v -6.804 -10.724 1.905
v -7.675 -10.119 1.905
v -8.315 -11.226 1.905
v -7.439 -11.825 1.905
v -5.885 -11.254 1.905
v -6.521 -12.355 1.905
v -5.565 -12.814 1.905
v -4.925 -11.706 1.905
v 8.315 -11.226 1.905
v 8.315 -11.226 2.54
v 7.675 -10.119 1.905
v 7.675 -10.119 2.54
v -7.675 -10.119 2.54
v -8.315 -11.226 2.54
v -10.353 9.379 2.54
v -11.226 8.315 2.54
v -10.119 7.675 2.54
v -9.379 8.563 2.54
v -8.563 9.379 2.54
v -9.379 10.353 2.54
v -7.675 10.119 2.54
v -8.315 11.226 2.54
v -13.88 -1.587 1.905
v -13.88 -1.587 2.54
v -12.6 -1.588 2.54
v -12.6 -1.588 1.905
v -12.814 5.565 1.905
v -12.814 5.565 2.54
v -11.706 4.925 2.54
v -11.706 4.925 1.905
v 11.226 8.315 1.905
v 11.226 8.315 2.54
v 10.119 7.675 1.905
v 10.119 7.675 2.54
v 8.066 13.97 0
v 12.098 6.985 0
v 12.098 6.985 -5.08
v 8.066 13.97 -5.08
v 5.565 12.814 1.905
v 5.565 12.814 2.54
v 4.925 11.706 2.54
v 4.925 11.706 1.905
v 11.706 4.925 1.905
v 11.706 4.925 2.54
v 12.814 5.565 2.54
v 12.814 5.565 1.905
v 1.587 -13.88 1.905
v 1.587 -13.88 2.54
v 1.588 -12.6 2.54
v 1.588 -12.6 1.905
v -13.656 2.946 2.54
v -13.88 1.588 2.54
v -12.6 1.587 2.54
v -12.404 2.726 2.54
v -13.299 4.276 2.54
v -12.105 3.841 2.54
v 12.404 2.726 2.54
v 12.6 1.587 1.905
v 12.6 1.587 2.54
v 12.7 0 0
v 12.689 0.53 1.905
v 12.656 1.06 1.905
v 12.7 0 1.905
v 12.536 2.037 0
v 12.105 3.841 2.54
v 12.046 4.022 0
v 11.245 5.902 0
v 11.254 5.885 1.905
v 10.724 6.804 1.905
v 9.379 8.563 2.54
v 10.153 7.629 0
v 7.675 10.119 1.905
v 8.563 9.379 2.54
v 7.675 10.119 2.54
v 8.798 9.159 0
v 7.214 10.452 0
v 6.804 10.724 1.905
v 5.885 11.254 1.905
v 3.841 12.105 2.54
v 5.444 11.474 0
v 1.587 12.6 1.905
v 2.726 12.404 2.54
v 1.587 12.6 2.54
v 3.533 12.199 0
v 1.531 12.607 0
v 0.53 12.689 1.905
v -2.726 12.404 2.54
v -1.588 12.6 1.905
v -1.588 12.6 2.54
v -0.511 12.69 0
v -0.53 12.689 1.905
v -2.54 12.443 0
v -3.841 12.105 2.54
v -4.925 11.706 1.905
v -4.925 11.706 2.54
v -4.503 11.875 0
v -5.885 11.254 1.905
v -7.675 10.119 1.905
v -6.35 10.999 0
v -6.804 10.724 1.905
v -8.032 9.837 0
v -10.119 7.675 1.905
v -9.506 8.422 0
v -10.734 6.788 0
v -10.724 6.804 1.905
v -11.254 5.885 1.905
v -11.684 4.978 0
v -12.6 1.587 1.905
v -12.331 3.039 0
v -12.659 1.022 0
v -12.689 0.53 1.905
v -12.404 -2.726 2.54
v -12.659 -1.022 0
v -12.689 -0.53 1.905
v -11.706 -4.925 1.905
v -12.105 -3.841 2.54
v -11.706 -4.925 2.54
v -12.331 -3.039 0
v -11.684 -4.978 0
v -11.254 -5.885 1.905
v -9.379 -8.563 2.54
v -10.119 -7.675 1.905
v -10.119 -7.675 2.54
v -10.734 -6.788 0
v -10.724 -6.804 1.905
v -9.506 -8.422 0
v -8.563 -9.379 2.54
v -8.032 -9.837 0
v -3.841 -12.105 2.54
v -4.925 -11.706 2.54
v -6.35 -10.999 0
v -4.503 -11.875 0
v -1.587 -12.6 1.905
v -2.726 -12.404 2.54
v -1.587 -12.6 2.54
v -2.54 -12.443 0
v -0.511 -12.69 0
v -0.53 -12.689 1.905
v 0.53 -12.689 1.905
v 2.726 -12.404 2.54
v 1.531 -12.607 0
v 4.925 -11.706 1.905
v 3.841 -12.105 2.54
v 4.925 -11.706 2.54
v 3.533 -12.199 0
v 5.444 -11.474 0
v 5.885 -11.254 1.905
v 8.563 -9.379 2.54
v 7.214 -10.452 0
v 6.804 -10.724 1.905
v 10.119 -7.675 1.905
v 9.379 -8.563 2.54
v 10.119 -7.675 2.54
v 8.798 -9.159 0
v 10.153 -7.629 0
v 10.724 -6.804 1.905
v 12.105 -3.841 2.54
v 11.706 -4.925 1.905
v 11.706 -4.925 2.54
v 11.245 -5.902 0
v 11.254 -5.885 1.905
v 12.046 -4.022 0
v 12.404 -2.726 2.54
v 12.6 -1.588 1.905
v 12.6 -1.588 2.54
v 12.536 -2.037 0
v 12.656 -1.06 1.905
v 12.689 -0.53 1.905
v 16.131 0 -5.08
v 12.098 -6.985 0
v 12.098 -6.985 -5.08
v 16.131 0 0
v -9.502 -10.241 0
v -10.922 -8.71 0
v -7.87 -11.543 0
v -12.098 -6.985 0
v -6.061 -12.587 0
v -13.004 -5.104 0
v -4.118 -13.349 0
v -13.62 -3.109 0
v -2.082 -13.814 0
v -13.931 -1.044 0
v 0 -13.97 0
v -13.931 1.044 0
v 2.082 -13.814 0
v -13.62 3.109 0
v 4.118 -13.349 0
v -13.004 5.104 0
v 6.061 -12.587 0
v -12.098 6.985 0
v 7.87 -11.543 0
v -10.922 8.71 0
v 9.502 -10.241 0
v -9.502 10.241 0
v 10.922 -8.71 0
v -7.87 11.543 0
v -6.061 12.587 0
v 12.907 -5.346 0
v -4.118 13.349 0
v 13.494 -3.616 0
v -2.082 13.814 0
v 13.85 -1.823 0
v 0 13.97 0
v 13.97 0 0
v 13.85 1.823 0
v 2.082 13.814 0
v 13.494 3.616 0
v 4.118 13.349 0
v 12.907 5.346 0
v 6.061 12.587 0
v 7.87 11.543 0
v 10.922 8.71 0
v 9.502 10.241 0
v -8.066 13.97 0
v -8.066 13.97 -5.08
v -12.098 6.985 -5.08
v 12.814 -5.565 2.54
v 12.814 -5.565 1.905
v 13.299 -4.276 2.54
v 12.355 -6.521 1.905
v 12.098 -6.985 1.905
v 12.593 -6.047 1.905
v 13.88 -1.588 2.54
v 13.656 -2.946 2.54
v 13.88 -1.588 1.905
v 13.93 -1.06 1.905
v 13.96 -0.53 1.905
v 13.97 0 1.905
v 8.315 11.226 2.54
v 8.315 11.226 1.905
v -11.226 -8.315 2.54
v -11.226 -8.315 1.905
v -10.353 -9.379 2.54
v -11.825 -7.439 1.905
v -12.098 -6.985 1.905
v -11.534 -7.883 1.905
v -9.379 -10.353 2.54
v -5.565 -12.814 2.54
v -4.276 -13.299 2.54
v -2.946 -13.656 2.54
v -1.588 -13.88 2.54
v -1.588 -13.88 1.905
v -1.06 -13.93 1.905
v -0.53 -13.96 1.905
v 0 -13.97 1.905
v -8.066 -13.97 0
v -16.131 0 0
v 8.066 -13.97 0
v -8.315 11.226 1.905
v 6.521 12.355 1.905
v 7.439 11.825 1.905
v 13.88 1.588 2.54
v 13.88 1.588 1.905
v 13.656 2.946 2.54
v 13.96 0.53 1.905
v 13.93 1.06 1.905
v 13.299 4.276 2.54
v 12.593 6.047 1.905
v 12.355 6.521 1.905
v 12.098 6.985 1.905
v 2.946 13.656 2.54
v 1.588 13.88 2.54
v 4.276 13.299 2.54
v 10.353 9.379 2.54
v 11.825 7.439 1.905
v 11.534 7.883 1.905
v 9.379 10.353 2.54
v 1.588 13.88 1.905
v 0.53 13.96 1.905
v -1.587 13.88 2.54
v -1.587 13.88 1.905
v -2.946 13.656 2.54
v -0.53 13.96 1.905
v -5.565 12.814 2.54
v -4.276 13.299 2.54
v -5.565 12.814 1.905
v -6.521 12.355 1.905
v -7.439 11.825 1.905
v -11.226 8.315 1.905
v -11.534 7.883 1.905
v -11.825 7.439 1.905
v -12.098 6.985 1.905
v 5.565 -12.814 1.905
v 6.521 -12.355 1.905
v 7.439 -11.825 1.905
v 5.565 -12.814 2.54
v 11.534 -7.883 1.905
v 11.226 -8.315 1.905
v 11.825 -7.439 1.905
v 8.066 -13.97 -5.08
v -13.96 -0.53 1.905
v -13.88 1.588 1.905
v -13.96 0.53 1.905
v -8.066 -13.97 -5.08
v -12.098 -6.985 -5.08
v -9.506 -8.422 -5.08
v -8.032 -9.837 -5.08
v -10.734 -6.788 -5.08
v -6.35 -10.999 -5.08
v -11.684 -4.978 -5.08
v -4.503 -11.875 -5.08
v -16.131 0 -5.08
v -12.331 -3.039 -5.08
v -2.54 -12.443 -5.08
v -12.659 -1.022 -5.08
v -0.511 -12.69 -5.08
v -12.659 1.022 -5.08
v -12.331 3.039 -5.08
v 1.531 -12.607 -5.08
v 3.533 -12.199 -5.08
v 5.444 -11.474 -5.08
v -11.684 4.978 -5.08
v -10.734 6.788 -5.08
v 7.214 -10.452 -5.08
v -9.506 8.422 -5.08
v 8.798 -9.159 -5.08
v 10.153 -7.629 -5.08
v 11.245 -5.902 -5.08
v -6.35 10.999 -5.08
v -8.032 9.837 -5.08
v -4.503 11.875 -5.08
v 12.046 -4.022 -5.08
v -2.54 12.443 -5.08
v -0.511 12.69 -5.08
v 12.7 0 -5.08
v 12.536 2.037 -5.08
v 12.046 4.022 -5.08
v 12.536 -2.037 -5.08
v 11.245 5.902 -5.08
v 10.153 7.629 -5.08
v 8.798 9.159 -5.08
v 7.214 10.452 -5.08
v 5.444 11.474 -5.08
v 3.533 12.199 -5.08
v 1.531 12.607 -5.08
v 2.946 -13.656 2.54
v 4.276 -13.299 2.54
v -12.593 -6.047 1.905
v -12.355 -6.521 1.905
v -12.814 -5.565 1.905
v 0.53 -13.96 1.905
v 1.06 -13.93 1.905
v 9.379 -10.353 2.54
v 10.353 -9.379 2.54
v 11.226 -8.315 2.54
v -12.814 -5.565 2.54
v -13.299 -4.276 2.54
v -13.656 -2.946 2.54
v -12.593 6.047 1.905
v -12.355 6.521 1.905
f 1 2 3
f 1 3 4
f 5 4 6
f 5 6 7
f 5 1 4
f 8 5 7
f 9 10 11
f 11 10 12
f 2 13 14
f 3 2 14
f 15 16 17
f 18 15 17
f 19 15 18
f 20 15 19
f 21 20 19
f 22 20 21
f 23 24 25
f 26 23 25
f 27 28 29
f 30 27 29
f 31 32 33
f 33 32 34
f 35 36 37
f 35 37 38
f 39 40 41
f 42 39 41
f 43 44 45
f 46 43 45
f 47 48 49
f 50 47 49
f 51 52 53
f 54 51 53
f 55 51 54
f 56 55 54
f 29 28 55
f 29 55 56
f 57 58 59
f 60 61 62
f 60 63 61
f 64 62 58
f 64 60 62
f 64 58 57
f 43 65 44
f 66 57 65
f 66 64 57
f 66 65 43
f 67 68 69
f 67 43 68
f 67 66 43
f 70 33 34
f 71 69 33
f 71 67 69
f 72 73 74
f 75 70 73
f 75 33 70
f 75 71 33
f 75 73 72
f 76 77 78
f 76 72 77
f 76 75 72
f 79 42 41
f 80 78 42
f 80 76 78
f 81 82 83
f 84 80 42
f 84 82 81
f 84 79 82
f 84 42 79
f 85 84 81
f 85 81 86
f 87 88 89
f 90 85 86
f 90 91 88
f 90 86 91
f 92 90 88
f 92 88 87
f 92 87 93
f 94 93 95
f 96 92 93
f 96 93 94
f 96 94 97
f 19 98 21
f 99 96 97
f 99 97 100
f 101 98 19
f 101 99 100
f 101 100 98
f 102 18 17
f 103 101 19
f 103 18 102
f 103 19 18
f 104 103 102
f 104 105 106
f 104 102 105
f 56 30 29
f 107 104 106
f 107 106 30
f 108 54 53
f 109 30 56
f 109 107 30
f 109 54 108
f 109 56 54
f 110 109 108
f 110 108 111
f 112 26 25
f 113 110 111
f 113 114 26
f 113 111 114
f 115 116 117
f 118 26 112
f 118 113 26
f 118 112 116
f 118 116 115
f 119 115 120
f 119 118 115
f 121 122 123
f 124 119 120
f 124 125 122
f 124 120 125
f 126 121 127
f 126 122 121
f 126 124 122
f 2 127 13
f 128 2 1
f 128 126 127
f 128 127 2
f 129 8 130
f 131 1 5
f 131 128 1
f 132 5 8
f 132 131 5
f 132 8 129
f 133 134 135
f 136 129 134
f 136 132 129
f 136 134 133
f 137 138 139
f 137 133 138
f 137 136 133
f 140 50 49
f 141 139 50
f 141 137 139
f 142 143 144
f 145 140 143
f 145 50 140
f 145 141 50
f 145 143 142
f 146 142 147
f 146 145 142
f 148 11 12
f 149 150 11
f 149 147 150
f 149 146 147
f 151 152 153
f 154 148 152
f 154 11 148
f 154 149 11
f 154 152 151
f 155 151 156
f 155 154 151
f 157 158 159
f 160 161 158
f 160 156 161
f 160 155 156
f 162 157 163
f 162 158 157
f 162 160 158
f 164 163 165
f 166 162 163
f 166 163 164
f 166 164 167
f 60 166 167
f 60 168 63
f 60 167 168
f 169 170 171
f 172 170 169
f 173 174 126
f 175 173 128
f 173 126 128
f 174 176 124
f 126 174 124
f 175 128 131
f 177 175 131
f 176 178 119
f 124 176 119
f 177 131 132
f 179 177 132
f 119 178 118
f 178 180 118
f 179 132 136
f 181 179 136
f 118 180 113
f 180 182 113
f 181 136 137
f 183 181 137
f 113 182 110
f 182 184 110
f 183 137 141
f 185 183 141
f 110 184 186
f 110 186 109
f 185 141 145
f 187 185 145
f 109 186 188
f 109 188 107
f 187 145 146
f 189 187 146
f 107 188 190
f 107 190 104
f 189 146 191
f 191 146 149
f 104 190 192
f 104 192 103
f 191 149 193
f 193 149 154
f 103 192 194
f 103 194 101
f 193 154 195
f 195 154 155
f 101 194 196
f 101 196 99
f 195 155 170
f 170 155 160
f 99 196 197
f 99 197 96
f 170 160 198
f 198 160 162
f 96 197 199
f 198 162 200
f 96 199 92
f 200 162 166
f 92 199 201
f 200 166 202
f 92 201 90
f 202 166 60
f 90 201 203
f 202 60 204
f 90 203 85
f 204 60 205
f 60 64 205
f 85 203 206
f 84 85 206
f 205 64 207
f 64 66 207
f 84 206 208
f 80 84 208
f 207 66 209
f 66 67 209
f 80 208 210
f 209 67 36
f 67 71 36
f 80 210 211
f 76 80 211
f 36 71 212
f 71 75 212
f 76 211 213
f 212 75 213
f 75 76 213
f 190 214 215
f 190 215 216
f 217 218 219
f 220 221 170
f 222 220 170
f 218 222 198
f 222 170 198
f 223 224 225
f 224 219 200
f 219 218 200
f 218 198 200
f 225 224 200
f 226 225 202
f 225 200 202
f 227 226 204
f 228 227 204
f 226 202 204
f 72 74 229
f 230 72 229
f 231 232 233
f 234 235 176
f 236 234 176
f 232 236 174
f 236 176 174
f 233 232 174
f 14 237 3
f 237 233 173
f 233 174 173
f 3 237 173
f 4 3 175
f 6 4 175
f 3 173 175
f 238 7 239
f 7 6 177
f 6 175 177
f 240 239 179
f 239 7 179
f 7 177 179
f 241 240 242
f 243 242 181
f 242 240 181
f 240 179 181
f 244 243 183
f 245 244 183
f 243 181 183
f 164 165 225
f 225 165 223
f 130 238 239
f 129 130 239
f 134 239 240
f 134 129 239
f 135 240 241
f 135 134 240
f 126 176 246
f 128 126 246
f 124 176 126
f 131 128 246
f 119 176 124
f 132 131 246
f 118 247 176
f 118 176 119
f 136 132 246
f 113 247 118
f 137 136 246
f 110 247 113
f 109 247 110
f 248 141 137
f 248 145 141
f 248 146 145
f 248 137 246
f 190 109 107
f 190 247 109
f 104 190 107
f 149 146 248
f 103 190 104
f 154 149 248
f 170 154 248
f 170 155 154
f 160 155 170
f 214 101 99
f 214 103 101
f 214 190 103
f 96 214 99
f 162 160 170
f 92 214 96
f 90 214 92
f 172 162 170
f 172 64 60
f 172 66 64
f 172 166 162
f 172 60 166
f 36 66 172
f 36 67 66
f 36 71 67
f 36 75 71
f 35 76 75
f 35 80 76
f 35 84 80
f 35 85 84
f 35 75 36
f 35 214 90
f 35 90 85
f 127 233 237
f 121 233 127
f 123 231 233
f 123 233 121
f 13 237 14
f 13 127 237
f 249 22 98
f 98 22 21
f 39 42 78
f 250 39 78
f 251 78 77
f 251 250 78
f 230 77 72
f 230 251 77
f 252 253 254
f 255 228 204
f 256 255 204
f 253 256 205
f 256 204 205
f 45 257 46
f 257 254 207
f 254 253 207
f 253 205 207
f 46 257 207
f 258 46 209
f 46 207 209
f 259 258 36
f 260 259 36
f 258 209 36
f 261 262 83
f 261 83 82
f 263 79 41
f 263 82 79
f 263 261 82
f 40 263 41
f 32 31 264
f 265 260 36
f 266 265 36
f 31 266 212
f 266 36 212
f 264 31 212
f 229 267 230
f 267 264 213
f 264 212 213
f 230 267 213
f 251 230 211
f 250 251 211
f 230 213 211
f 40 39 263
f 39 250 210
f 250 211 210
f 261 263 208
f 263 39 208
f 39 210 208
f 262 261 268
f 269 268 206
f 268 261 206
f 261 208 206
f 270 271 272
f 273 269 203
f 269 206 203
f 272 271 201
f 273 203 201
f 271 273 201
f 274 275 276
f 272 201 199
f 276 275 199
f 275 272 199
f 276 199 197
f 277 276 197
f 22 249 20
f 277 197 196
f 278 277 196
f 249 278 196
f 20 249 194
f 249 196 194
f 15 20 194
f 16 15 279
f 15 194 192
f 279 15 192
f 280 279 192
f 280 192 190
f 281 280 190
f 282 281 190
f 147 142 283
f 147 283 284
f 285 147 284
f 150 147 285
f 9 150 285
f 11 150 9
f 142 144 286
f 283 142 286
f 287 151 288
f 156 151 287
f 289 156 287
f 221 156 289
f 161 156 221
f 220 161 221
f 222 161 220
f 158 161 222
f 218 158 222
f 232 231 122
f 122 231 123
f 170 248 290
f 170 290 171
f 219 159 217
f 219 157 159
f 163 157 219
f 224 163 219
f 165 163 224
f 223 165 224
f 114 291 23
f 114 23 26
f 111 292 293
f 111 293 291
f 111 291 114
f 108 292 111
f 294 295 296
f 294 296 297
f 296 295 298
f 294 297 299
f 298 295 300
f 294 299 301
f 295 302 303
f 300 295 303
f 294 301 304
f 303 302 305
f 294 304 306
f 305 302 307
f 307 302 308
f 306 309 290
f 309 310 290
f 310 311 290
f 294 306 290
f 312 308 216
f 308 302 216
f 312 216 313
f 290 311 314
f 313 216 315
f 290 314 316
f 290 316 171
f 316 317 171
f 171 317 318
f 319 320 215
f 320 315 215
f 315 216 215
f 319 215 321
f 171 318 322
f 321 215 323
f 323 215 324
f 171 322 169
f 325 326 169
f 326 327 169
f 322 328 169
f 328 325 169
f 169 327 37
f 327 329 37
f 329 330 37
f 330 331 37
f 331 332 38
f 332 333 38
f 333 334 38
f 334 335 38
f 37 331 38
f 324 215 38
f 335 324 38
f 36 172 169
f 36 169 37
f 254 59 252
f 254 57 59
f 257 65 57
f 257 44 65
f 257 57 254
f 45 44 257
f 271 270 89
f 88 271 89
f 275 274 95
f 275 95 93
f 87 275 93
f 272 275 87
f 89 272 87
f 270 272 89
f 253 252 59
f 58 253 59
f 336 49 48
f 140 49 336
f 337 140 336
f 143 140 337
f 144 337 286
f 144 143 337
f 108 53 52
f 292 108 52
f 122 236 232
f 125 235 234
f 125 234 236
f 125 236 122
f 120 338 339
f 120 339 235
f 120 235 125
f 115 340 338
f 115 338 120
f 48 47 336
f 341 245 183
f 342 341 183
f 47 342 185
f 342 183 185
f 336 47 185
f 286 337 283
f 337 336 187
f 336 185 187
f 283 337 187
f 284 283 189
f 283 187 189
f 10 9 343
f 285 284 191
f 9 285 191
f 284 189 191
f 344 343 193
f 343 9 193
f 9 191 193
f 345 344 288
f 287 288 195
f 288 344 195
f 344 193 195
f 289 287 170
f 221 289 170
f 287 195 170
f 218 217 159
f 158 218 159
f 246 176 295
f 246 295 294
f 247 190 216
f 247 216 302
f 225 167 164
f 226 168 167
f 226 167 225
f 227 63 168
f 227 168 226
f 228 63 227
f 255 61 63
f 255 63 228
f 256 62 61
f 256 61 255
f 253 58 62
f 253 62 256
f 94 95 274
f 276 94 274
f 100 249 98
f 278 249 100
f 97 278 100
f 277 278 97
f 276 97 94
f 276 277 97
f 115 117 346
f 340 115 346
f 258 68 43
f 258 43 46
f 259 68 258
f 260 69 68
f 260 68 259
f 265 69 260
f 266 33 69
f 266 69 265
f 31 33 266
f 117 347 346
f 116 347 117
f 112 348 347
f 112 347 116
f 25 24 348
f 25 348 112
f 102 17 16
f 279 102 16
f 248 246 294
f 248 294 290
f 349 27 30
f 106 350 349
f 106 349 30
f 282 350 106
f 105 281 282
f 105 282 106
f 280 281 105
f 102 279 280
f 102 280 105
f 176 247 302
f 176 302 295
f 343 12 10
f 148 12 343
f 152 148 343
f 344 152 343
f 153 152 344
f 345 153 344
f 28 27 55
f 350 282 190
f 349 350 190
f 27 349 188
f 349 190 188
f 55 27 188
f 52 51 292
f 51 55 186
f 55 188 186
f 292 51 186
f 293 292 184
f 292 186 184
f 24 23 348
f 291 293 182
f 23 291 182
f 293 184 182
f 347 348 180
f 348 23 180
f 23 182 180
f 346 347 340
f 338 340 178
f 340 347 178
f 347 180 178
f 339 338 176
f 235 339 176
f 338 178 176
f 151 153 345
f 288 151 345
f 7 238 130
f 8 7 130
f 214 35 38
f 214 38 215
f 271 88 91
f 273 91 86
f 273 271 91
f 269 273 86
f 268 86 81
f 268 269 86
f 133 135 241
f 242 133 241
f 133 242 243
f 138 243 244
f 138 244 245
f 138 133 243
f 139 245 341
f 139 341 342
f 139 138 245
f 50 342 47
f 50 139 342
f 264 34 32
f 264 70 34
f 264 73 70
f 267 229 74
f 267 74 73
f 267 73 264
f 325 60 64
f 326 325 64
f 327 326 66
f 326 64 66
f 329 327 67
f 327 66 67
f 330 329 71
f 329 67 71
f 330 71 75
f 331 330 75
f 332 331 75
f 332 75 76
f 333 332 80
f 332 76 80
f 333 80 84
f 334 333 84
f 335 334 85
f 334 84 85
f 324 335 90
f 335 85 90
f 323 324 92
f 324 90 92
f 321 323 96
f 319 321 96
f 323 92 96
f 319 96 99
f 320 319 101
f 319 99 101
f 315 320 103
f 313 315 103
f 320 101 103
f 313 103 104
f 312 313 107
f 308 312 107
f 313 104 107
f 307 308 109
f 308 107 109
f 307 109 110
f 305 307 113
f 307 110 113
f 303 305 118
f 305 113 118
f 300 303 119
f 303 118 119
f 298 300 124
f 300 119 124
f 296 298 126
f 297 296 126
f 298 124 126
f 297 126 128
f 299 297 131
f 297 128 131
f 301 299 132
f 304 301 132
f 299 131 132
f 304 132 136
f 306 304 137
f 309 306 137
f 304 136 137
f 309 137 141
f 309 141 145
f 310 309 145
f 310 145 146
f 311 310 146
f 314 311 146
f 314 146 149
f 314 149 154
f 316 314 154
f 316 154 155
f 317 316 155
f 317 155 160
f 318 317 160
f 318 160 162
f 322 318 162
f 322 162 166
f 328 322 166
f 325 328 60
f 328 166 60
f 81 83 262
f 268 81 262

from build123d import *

# Parameters (mm, degrees)
F1_R     = 12.7
F2_DEPTH = 2.54
F3_DEPTH = 5.08
F5_DEPTH = 0.635


with BuildPart() as f2:
    # F1 (on Top) → F2 (new body)
    with BuildSketch(Plane.XY):
        with BuildLine():
            ThreePointArc((12.0983740846, -6.9850013965), (13.4939835846, -3.6157028389), (13.97, 0))
            ThreePointArc((13.97, 0), (13.493983574, 3.6157028785), (12.0983740436, 6.9850014675))
            ThreePointArc((12.0983740436, 6.9850014675), (6.9849992663, 12.0983753145), (0, 13.97))
            ThreePointArc((0, 13.97), (-6.9849993112, 12.0983752885), (-12.0983740955, 6.9850013775))
            ThreePointArc((-12.0983740955, 6.9850013775), (-13.97, 8.2e-08), (-12.0983741776, -6.9850012354))
            ThreePointArc((-12.0983741776, -6.9850012354), (-6.9849993823, -12.0983752475), (0, -13.97))
            ThreePointArc((0, -13.97), (6.9849993017, -12.098375294), (12.0983740846, -6.9850013965))
        make_face()
        Circle(F1_R, mode=Mode.SUBTRACT)
    extrude(amount=F2_DEPTH)

    # F4 (on face) → F5 (cut)
    with BuildSketch(Plane.XY.offset(2.54)):
        with BuildLine():
            Line((-12.6003906189, 1.5875), (-13.8795080514, 1.5875))
            ThreePointArc((-13.8795080514, 1.5875), (-13.97, 0), (-13.8795080514, -1.5875))
            Line((-13.8795080514, -1.5875), (-12.6003906189, -1.5875))
            ThreePointArc((-12.6003906189, -1.5875), (-12.7, 0), (-12.6003906189, 1.5875))
        make_face()
        with BuildLine():
            Line((-10.1185083736, 7.675010638), (-11.2262565646, 8.3145693542))
            ThreePointArc((-11.2262565646, 8.3145693542), (-12.0983748909, 6.985), (-12.8137565646, 5.5649386972))
            Line((-12.8137565646, 5.5649386972), (-11.7060083736, 4.925379981))
            ThreePointArc((-11.7060083736, 4.925379981), (-10.9985226281, 6.35), (-10.1185083736, 7.675010638))
        make_face()
        with BuildLine():
            ThreePointArc((-5.5649386972, 12.8137565646), (-6.985, 12.0983748909), (-8.3145693542, 11.2262565646))
            Line((-8.3145693542, 11.2262565646), (-7.675010638, 10.1185083736))
            ThreePointArc((-7.675010638, 10.1185083736), (-6.35, 10.9985226281), (-4.925379981, 11.7060083736))
            Line((-4.925379981, 11.7060083736), (-5.5649386972, 12.8137565646))
        make_face()
        with BuildLine():
            ThreePointArc((1.5875, 13.8795080514), (0, 13.97), (-1.5875, 13.8795080514))
            Line((-1.5875, 13.8795080514), (-1.5875, 12.6003906189))
            ThreePointArc((-1.5875, 12.6003906189), (0, 12.7), (1.5875, 12.6003906189))
            Line((1.5875, 12.6003906189), (1.5875, 13.8795080514))
        make_face()
        with BuildLine():
            ThreePointArc((8.3145693542, 11.2262565646), (6.985, 12.0983748909), (5.5649386972, 12.8137565646))
            Line((5.5649386972, 12.8137565646), (4.925379981, 11.7060083736))
            ThreePointArc((4.925379981, 11.7060083736), (6.35, 10.9985226281), (7.675010638, 10.1185083736))
            Line((7.675010638, 10.1185083736), (8.3145693542, 11.2262565646))
        make_face()
        with BuildLine():
            ThreePointArc((13.97, 0), (13.9473586653, 0.7950385278), (13.8795080514, 1.5875))
            Line((13.8795080514, 1.5875), (12.6003906189, 1.5875))
            ThreePointArc((12.6003906189, 1.5875), (12.6750731923, 0.7953109893), (12.7, 0))
            ThreePointArc((12.7, 0), (12.6750731923, -0.7953109893), (12.6003906189, -1.5875))
            Line((12.6003906189, -1.5875), (13.8795080514, -1.5875))
            ThreePointArc((13.8795080514, -1.5875), (13.9473586653, -0.7950385278), (13.97, 0))
        make_face()
        with BuildLine():
            ThreePointArc((11.2262565646, -8.3145693542), (12.0983748909, -6.985), (12.8137565646, -5.5649386972))
            Line((12.8137565646, -5.5649386972), (11.7060083736, -4.925379981))
            ThreePointArc((11.7060083736, -4.925379981), (10.9985226281, -6.35), (10.1185083736, -7.675010638))
            Line((10.1185083736, -7.675010638), (11.2262565646, -8.3145693542))
        make_face()
        with BuildLine():
            Line((4.925379981, -11.7060083736), (5.5649386972, -12.8137565646))
            ThreePointArc((5.5649386972, -12.8137565646), (6.985, -12.0983748909), (8.3145693542, -11.2262565646))
            Line((8.3145693542, -11.2262565646), (7.675010638, -10.1185083736))
            ThreePointArc((7.675010638, -10.1185083736), (6.35, -10.9985226281), (4.925379981, -11.7060083736))
        make_face()
        with BuildLine():
            Line((-1.5875, -12.6003906189), (-1.5875, -13.8795080514))
            ThreePointArc((-1.5875, -13.8795080514), (0, -13.97), (1.5875, -13.8795080514))
            Line((1.5875, -13.8795080514), (1.5875, -12.6003906189))
            ThreePointArc((1.5875, -12.6003906189), (0, -12.7), (-1.5875, -12.6003906189))
        make_face()
        with BuildLine():
            Line((-7.675010638, -10.1185083736), (-8.3145693542, -11.2262565646))
            ThreePointArc((-8.3145693542, -11.2262565646), (-6.985, -12.0983748909), (-5.5649386972, -12.8137565646))
            Line((-5.5649386972, -12.8137565646), (-4.925379981, -11.7060083736))
            ThreePointArc((-4.925379981, -11.7060083736), (-6.35, -10.9985226281), (-7.675010638, -10.1185083736))
        make_face()
        with BuildLine():
            Line((-11.7060083736, -4.925379981), (-12.8137565646, -5.5649386972))
            ThreePointArc((-12.8137565646, -5.5649386972), (-12.0983748909, -6.985), (-11.2262565646, -8.3145693542))
            Line((-11.2262565646, -8.3145693542), (-10.1185083736, -7.675010638))
            ThreePointArc((-10.1185083736, -7.675010638), (-10.9985226281, -6.35), (-11.7060083736, -4.925379981))
        make_face()
        with BuildLine():
            ThreePointArc((12.8137565646, 5.5649386972), (12.0983748909, 6.985), (11.2262565646, 8.3145693542))
            Line((11.2262565646, 8.3145693542), (10.1185083736, 7.675010638))
            ThreePointArc((10.1185083736, 7.675010638), (10.9985226281, 6.35), (11.7060083736, 4.925379981))
            Line((11.7060083736, 4.925379981), (12.8137565646, 5.5649386972))
        make_face()
    extrude(amount=-F5_DEPTH, mode=Mode.SUBTRACT)


with BuildPart() as f3:
    # F1 (on Top) → F3 (new body)
    with BuildSketch(Plane.XY):
        with BuildLine():
            ThreePointArc((-12.0983740955, 6.9850013775), (-6.9849993112, 12.0983752885), (0, 13.97))
            Line((0, 13.97), (-8.0655832606, 13.97))
            Line((-8.0655832606, 13.97), (-12.0983740955, 6.9850013775))
        make_face()
        with BuildLine():
            ThreePointArc((-12.0983741776, -6.9850012354), (-13.97, 8.2e-08), (-12.0983740955, 6.9850013775))
            Line((-12.0983740955, 6.9850013775), (-16.1311665212, 0))
            Line((-16.1311665212, 0), (-12.0983741776, -6.9850012354))
        make_face()
        with BuildLine():
            Line((-8.0655832606, -13.97), (0, -13.97))
            ThreePointArc((0, -13.97), (-6.9849993823, -12.0983752475), (-12.0983741776, -6.9850012354))
            Line((-12.0983741776, -6.9850012354), (-8.0655832606, -13.97))
        make_face()
        with BuildLine():
            Line((8.0655832606, -13.97), (12.0983740846, -6.9850013965))
            ThreePointArc((12.0983740846, -6.9850013965), (6.9849993017, -12.098375294), (0, -13.97))
            Line((0, -13.97), (8.0655832606, -13.97))
        make_face()
        with BuildLine():
            ThreePointArc((12.0983740436, 6.9850014675), (13.493983574, 3.6157028785), (13.97, 0))
            ThreePointArc((13.97, 0), (13.4939835846, -3.6157028389), (12.0983740846, -6.9850013965))
            Line((12.0983740846, -6.9850013965), (16.1311665212, 0))
            Line((16.1311665212, 0), (12.0983740436, 6.9850014675))
        make_face()
        with BuildLine():
            ThreePointArc((0, 13.97), (6.9849992663, 12.0983753145), (12.0983740436, 6.9850014675))
            Line((12.0983740436, 6.9850014675), (8.0655832606, 13.97))
            Line((8.0655832606, 13.97), (0, 13.97))
        make_face()
        with BuildLine():
            ThreePointArc((12.0983740846, -6.9850013965), (13.4939835846, -3.6157028389), (13.97, 0))
            ThreePointArc((13.97, 0), (13.493983574, 3.6157028785), (12.0983740436, 6.9850014675))
            ThreePointArc((12.0983740436, 6.9850014675), (6.9849992663, 12.0983753145), (0, 13.97))
            ThreePointArc((0, 13.97), (-6.9849993112, 12.0983752885), (-12.0983740955, 6.9850013775))
            ThreePointArc((-12.0983740955, 6.9850013775), (-13.97, 8.2e-08), (-12.0983741776, -6.9850012354))
            ThreePointArc((-12.0983741776, -6.9850012354), (-6.9849993823, -12.0983752475), (0, -13.97))
            ThreePointArc((0, -13.97), (6.9849993017, -12.098375294), (12.0983740846, -6.9850013965))
        make_face()
        Circle(F1_R, mode=Mode.SUBTRACT)
    extrude(amount=-F3_DEPTH)


solid = Compound([f2.part, f3.part])
